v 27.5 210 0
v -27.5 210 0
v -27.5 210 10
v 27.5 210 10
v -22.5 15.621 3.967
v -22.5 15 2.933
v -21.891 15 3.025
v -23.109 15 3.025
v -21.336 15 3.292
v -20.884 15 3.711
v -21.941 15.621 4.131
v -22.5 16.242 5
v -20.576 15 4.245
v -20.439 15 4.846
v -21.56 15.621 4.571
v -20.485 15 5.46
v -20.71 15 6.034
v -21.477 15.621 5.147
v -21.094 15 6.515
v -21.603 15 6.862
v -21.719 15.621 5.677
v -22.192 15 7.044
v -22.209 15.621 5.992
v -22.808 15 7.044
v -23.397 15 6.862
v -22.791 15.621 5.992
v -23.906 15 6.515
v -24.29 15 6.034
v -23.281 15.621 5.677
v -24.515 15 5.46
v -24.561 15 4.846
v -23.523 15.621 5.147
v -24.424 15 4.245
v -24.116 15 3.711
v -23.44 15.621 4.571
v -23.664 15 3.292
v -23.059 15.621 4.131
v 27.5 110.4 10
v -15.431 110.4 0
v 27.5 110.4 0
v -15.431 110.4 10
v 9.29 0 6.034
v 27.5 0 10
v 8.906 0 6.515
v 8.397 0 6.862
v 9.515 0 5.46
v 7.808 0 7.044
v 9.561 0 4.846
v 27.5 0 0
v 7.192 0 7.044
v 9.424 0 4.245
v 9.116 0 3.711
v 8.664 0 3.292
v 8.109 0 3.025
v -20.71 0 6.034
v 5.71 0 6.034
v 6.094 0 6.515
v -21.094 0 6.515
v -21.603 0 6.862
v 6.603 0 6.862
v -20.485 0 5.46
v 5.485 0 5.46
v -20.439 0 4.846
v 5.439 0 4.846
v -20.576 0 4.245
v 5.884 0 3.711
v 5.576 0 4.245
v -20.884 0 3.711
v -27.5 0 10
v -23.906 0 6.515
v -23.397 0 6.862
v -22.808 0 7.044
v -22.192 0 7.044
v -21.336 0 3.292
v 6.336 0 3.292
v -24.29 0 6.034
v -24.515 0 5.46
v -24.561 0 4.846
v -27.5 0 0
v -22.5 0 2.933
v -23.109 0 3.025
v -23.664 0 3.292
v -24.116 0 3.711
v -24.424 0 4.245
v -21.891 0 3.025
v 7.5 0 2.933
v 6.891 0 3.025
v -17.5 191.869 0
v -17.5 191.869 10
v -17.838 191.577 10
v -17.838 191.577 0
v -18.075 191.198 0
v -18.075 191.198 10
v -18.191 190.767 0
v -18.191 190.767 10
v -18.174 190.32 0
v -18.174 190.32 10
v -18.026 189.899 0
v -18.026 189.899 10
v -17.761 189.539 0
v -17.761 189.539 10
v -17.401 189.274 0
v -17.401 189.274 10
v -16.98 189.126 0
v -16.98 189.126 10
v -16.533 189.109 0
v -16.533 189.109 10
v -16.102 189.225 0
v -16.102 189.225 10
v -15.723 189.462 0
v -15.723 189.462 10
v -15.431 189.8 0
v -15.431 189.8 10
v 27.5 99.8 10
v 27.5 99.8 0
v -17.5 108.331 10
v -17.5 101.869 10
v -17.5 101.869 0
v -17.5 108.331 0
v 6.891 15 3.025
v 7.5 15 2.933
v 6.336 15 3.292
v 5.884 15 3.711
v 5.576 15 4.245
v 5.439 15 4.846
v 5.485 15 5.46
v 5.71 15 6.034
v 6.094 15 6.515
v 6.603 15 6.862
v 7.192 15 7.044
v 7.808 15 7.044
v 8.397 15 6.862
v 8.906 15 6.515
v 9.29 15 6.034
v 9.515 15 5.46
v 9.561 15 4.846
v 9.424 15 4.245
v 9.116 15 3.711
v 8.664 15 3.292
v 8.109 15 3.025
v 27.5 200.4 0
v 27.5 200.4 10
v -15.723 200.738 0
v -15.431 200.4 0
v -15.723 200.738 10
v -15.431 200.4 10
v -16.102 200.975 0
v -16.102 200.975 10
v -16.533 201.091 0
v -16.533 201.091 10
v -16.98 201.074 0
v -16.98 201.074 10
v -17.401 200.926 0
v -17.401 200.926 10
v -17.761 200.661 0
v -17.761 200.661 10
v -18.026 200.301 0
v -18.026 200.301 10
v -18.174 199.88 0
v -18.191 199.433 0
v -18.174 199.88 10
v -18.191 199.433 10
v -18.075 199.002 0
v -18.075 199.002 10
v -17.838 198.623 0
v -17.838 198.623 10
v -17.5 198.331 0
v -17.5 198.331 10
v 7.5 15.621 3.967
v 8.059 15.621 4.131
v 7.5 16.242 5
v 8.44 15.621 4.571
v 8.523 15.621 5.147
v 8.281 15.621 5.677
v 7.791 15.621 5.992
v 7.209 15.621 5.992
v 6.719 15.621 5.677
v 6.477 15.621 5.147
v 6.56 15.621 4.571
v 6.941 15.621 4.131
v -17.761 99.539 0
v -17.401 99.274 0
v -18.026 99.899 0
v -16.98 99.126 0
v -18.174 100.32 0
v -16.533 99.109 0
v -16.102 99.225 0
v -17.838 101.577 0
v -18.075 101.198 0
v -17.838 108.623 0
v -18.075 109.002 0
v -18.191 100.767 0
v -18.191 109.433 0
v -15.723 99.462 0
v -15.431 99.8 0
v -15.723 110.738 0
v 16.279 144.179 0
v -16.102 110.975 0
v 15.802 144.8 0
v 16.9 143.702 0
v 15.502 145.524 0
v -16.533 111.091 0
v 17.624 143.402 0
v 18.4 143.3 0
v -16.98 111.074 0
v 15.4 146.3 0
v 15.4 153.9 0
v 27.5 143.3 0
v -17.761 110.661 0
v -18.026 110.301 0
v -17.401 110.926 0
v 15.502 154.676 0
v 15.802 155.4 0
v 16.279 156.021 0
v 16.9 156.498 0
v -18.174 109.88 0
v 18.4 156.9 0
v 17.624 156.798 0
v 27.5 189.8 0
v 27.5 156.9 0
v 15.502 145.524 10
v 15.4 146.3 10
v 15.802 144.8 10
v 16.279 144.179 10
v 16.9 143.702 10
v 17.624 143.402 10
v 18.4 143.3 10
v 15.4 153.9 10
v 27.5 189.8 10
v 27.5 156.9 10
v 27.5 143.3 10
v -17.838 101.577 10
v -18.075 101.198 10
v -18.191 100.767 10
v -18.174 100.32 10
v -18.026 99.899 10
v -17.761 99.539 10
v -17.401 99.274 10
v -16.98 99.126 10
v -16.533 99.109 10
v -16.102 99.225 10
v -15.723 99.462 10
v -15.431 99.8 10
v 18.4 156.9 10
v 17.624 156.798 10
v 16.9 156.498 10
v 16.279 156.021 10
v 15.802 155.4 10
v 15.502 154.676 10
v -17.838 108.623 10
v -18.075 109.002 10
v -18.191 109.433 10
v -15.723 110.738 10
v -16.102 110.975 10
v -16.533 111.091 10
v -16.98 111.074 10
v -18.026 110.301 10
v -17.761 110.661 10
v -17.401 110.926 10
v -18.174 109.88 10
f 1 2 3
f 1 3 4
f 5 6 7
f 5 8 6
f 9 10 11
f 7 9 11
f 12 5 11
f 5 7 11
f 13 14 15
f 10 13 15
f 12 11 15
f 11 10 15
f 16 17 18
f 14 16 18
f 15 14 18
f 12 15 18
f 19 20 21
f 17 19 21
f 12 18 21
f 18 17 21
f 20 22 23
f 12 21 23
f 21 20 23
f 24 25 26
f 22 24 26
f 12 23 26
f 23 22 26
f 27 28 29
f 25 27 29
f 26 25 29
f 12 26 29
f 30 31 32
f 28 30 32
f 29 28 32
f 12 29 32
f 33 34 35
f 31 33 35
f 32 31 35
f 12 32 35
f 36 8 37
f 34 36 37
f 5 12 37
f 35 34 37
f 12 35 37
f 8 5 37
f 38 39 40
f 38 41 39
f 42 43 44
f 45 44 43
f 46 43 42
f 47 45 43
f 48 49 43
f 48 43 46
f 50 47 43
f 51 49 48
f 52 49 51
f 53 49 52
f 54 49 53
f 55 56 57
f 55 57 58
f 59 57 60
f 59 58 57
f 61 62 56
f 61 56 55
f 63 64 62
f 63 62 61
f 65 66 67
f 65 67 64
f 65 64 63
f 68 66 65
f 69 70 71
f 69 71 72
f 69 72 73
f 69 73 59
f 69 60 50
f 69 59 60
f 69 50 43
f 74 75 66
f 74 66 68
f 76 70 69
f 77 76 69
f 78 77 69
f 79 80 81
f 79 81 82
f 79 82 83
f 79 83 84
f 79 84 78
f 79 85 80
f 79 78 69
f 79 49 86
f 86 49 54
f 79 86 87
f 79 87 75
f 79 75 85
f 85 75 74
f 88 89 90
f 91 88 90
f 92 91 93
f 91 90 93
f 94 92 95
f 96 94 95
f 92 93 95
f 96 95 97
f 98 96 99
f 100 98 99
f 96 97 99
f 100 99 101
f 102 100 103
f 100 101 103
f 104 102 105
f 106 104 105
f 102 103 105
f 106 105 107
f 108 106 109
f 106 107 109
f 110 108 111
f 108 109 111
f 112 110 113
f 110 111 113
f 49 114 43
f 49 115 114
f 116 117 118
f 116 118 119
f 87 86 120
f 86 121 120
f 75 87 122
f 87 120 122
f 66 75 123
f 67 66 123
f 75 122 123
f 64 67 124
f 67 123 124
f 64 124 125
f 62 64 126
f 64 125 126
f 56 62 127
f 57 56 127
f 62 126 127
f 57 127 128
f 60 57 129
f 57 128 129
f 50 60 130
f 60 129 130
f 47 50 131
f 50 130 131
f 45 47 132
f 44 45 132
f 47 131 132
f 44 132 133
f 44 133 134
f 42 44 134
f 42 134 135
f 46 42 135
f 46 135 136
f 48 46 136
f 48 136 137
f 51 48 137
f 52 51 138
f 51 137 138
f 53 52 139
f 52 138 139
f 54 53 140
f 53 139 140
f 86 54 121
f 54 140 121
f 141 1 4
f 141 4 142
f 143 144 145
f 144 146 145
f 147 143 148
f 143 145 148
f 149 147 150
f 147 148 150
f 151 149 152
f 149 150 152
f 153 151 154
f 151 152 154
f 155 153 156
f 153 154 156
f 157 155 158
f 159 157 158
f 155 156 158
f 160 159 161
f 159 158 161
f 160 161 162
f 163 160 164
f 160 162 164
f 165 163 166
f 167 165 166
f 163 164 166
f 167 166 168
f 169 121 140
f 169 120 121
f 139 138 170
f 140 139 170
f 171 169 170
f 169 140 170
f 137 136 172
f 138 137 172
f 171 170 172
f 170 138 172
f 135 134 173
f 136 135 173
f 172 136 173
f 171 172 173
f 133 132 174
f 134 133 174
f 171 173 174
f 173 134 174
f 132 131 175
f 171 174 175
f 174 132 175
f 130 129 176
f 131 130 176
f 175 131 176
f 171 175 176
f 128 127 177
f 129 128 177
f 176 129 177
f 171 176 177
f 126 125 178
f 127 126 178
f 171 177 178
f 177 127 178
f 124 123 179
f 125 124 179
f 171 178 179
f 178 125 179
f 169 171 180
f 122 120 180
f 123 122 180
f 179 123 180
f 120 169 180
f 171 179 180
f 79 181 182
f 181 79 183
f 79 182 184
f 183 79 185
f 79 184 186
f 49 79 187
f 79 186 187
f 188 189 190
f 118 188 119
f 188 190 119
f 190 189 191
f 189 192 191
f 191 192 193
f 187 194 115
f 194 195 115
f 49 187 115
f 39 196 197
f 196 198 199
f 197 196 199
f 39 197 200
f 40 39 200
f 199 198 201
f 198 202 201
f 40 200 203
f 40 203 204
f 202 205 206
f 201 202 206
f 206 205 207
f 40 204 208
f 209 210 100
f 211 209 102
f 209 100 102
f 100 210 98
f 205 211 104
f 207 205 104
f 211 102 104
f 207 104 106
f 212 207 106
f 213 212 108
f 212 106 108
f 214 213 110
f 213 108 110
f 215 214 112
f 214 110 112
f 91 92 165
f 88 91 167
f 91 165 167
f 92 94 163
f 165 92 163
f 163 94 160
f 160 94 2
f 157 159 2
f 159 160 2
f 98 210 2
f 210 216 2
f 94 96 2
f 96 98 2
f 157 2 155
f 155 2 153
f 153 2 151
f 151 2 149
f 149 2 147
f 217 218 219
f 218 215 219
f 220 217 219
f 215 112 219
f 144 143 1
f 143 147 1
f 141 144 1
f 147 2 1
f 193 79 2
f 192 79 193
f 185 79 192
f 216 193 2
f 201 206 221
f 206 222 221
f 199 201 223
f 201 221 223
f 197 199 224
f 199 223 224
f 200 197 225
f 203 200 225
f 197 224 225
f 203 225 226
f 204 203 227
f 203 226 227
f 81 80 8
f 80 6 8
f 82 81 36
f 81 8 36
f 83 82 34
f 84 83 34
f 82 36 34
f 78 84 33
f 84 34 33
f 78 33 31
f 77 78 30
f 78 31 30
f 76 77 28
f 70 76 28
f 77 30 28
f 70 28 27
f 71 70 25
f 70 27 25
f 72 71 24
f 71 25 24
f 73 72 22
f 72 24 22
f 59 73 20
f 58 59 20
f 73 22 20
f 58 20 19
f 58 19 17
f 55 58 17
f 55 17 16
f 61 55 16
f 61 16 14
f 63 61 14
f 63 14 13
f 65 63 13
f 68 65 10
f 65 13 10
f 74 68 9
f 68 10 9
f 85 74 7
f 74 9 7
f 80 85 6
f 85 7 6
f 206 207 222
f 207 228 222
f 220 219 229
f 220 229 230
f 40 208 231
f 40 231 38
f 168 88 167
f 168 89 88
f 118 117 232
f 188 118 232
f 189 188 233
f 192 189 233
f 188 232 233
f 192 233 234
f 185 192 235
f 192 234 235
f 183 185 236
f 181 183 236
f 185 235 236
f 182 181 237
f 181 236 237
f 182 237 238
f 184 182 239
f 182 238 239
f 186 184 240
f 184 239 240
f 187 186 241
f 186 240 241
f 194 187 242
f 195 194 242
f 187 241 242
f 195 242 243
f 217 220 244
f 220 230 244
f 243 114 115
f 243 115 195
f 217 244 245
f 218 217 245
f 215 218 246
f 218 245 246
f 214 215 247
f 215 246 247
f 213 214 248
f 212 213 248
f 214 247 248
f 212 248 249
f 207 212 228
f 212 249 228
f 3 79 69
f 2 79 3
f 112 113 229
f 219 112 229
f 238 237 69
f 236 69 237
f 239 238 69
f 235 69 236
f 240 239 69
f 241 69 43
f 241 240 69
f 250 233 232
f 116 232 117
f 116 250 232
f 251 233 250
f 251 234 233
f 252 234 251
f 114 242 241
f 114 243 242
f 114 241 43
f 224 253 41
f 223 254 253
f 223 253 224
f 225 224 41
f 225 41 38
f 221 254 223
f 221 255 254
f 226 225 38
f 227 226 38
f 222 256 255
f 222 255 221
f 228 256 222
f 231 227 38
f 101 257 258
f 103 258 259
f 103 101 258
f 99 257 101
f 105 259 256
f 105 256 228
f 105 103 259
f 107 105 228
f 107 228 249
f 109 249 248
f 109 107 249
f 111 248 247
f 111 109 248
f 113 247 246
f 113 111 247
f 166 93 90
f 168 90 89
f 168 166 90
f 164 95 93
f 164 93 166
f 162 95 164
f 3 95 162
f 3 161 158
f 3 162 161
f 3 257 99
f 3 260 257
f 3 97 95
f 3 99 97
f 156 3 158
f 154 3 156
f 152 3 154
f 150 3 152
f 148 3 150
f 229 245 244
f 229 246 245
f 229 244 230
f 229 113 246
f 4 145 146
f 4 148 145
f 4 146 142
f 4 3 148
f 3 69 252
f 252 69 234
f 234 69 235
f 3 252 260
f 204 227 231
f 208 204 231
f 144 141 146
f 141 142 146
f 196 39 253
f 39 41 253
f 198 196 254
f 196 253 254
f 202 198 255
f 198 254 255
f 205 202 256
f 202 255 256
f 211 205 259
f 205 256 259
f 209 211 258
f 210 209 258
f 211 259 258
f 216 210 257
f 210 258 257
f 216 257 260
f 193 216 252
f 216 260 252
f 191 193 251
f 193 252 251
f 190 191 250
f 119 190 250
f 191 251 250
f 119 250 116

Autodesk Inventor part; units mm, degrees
ref_plane "YZ Plane" through (0, 0, 0) normal (1, 0, 0) x (0, 1, 0)
ref_plane "XZ Plane" through (0, 0, 0) normal (0, 1, 0) x (-1, 0, 0)
ref_plane "XY Plane" through (0, 0, 0) normal (0, 0, 1) x (1, 0, 0)
sketch "Skizze1" plane through (0, 0, 0) normal (0, 0, 1) x (1, 0, 0)
  line L0 (27.5, 0) -> (-27.5, 0)
  line L1 (-27.5, 0) -> (-27.5, 210)
  line L2 (-27.5, 210) -> (27.5, 210)
  line L3 (27.5, 210) -> (27.5, 0)
  line L4 (0, 252) -> (0, -42) projected
  line L5 (-38.5, 0) -> (38.5, 0) projected
  point P0 (0, 0)
  point P1 (0, 0)
  dimension "d0" = 210
  dimension "d1" = 55
extrude "Extrusion1" add sketch "Skizze1" along normal blind 10
sketch "Skizze2" plane through (0, 0, 10) normal (0, 0, 1) x (1, 0, 0)
  line L0 (27.5, 210) -> (27.5, 0) projected
  circle A0 centre (3.5, 195.1) radius 4.3 projected
  circle A1 centre (-6.5, 192.1) radius 1.2295 projected
  circle A2 centre (-6.5, 198.1) radius 1.2295 projected
  line L1 (21.5, 200.1) -> (-17.5, 200.1) projected
  line L2 (-17.5, 190.1) -> (-17.5, 200.1) projected
  line L3 (21.5, 190.1) -> (-17.5, 190.1) projected
  line L4 (21.5, 190.1) -> (21.5, 200.1) projected
  line L5 (19.1583, 143.6) -> (26.6417, 143.6) projected
  arc A3 (19.1583, 156.6) -> (19.1583, 143.6) centre (22.9, 150.1) ccw projected
  line L6 (26.6417, 156.6) -> (19.1583, 156.6) projected
  arc A4 (26.6417, 143.6) -> (26.6417, 156.6) centre (22.9, 150.1) ccw projected
  circle A5 centre (3.5, 105.1) radius 4.3 projected
  circle A6 centre (-6.5, 102.1) radius 1.2295 projected
  circle A7 centre (-6.5, 108.1) radius 1.2295 projected
  line L7 (21.5, 110.1) -> (-17.5, 110.1) projected
  line L8 (-17.5, 100.1) -> (-17.5, 110.1) projected
  line L9 (21.5, 100.1) -> (-17.5, 100.1) projected
  line L10 (21.5, 100.1) -> (21.5, 110.1) projected
  line L11 (27.5, 200.4) -> (-15.4311, 200.4)
  line L12 (-15.4311, 189.8) -> (27.5, 189.8)
  line L13 (27.5, 189.8) -> (27.5, 200.4)
  arc A8 (-17.5, 191.8689) -> (-15.4311, 189.8) centre (-16.7, 190.6) ccw
  arc A9 (-15.4311, 200.4) -> (-17.5, 198.3311) centre (-16.7, 199.6) ccw
  line L14 (22.9, 150.1) -> (-7.7295, 150.1) construction
  line L15 (-17.5, 190.1) -> (-17.5, 189.8)
  line L16 (-17.5, 200.4) -> (-17.5, 200.1)
  line L17 (-17.5, 198.3311) -> (-17.5, 191.8689)
  circle A10 centre (3.5, 105.1) radius 4.3
  circle A11 centre (-6.5, 108.1) radius 1.2295
  circle A12 centre (-6.5, 102.1) radius 1.2295
  line L18 (21.5, 100.1) -> (-17.5, 100.1)
  line L19 (-17.5, 110.1) -> (-17.5, 100.1)
  line L20 (21.5, 110.1) -> (-17.5, 110.1)
  line L21 (21.5, 110.1) -> (21.5, 100.1)
  line L22 (27.5, 99.8) -> (-15.4311, 99.8)
  line L23 (-15.4311, 110.4) -> (27.5, 110.4)
  line L24 (27.5, 110.4) -> (27.5, 99.8)
  arc A13 (-15.4311, 110.4) -> (-17.5, 108.3311) centre (-16.7, 109.6) ccw
  arc A14 (-17.5, 101.8689) -> (-15.4311, 99.8) centre (-16.7, 100.6) ccw
  line L25 (-17.5, 110.1) -> (-17.5, 110.4)
  line L26 (-17.5, 99.8) -> (-17.5, 100.1)
  line L27 (-17.5, 101.8689) -> (-17.5, 108.3311)
  line L28 (27.5, 156.9) -> (18.4, 156.9)
  line L29 (15.4, 153.9) -> (15.4, 146.3)
  line L30 (18.4, 143.3) -> (27.5, 143.3)
  line L31 (27.5, 143.3) -> (27.5, 156.9)
  arc A15 (18.4, 156.9) -> (15.4, 153.9) centre (18.4, 153.9) ccw
  arc A16 (15.4, 146.3) -> (18.4, 143.3) centre (18.4, 146.3) ccw
  point P0 (0, 0)
  dimension "d4" = 0.3
  dimension "d5" = 0.3
  dimension "d6" = 3
  dimension "d7" = 3
  dimension "d8" = 0.8
  dimension "d9" = 0.8
  dimension "d10" = 0.8
  dimension "d11" = 0.8
  dimension "d13" = 10.6
  dimension "d15" = 0.3
  dimension "d16" = 0.3
  dimension "d17" = 12.1
  dimension "d18" = 3
extrude "Extrusion2" cut sketch "Skizze2" against normal through all contours L0 L22 A14 L8 L9 L10 L7 A13 L23 | L0 A4 L6 A3 L29 A15 L28 | L0 L12 A8 L2 L3 L4 L1 A9 L11 | L2 L1 L4 L3 | A4 L0 | L0 A4 L5 A3 L6 | L0 L30 A16 L29 A3 L5 A4 | L8 L7 L10 L9 | A0 | A1 | A2 | A5 | A6 | A7
sketch "Skizze3" plane through (-27.5, 0, 0) normal (0, -1, 0) x (1, 0, 0)
  line L0 (55, 10) -> (0, 10) projected
  line L1 (0, 0) -> (0, 10) projected
  point P0 (27.5, 0)
  point P1 (5, 5)
  point P2 (35, 5)
  dimension "d21" = 30
  dimension "d22" = 5
  dimension "d23" = 5
  dimension "d24" = 5
hole "Bohrung1" at (-22.5, 0, 5) at (7.5, 0, 5) direction (0, 1, 0) diameter 4.134 depth 15 tip angle 118 thread size "M5x0.8" class "6H" standard "ISO Metric profile"
equation "\"d4\" = d5"
equation "\"d7\" = d6"
equation "\"d9\" = d8"
equation "\"d10\" = d8"
equation "\"d11\" = d10"
equation "\"d16\" = d15"
equation "\"d24\" = d23"
properties part number "Rückhalter" material "Stainless Steel"
